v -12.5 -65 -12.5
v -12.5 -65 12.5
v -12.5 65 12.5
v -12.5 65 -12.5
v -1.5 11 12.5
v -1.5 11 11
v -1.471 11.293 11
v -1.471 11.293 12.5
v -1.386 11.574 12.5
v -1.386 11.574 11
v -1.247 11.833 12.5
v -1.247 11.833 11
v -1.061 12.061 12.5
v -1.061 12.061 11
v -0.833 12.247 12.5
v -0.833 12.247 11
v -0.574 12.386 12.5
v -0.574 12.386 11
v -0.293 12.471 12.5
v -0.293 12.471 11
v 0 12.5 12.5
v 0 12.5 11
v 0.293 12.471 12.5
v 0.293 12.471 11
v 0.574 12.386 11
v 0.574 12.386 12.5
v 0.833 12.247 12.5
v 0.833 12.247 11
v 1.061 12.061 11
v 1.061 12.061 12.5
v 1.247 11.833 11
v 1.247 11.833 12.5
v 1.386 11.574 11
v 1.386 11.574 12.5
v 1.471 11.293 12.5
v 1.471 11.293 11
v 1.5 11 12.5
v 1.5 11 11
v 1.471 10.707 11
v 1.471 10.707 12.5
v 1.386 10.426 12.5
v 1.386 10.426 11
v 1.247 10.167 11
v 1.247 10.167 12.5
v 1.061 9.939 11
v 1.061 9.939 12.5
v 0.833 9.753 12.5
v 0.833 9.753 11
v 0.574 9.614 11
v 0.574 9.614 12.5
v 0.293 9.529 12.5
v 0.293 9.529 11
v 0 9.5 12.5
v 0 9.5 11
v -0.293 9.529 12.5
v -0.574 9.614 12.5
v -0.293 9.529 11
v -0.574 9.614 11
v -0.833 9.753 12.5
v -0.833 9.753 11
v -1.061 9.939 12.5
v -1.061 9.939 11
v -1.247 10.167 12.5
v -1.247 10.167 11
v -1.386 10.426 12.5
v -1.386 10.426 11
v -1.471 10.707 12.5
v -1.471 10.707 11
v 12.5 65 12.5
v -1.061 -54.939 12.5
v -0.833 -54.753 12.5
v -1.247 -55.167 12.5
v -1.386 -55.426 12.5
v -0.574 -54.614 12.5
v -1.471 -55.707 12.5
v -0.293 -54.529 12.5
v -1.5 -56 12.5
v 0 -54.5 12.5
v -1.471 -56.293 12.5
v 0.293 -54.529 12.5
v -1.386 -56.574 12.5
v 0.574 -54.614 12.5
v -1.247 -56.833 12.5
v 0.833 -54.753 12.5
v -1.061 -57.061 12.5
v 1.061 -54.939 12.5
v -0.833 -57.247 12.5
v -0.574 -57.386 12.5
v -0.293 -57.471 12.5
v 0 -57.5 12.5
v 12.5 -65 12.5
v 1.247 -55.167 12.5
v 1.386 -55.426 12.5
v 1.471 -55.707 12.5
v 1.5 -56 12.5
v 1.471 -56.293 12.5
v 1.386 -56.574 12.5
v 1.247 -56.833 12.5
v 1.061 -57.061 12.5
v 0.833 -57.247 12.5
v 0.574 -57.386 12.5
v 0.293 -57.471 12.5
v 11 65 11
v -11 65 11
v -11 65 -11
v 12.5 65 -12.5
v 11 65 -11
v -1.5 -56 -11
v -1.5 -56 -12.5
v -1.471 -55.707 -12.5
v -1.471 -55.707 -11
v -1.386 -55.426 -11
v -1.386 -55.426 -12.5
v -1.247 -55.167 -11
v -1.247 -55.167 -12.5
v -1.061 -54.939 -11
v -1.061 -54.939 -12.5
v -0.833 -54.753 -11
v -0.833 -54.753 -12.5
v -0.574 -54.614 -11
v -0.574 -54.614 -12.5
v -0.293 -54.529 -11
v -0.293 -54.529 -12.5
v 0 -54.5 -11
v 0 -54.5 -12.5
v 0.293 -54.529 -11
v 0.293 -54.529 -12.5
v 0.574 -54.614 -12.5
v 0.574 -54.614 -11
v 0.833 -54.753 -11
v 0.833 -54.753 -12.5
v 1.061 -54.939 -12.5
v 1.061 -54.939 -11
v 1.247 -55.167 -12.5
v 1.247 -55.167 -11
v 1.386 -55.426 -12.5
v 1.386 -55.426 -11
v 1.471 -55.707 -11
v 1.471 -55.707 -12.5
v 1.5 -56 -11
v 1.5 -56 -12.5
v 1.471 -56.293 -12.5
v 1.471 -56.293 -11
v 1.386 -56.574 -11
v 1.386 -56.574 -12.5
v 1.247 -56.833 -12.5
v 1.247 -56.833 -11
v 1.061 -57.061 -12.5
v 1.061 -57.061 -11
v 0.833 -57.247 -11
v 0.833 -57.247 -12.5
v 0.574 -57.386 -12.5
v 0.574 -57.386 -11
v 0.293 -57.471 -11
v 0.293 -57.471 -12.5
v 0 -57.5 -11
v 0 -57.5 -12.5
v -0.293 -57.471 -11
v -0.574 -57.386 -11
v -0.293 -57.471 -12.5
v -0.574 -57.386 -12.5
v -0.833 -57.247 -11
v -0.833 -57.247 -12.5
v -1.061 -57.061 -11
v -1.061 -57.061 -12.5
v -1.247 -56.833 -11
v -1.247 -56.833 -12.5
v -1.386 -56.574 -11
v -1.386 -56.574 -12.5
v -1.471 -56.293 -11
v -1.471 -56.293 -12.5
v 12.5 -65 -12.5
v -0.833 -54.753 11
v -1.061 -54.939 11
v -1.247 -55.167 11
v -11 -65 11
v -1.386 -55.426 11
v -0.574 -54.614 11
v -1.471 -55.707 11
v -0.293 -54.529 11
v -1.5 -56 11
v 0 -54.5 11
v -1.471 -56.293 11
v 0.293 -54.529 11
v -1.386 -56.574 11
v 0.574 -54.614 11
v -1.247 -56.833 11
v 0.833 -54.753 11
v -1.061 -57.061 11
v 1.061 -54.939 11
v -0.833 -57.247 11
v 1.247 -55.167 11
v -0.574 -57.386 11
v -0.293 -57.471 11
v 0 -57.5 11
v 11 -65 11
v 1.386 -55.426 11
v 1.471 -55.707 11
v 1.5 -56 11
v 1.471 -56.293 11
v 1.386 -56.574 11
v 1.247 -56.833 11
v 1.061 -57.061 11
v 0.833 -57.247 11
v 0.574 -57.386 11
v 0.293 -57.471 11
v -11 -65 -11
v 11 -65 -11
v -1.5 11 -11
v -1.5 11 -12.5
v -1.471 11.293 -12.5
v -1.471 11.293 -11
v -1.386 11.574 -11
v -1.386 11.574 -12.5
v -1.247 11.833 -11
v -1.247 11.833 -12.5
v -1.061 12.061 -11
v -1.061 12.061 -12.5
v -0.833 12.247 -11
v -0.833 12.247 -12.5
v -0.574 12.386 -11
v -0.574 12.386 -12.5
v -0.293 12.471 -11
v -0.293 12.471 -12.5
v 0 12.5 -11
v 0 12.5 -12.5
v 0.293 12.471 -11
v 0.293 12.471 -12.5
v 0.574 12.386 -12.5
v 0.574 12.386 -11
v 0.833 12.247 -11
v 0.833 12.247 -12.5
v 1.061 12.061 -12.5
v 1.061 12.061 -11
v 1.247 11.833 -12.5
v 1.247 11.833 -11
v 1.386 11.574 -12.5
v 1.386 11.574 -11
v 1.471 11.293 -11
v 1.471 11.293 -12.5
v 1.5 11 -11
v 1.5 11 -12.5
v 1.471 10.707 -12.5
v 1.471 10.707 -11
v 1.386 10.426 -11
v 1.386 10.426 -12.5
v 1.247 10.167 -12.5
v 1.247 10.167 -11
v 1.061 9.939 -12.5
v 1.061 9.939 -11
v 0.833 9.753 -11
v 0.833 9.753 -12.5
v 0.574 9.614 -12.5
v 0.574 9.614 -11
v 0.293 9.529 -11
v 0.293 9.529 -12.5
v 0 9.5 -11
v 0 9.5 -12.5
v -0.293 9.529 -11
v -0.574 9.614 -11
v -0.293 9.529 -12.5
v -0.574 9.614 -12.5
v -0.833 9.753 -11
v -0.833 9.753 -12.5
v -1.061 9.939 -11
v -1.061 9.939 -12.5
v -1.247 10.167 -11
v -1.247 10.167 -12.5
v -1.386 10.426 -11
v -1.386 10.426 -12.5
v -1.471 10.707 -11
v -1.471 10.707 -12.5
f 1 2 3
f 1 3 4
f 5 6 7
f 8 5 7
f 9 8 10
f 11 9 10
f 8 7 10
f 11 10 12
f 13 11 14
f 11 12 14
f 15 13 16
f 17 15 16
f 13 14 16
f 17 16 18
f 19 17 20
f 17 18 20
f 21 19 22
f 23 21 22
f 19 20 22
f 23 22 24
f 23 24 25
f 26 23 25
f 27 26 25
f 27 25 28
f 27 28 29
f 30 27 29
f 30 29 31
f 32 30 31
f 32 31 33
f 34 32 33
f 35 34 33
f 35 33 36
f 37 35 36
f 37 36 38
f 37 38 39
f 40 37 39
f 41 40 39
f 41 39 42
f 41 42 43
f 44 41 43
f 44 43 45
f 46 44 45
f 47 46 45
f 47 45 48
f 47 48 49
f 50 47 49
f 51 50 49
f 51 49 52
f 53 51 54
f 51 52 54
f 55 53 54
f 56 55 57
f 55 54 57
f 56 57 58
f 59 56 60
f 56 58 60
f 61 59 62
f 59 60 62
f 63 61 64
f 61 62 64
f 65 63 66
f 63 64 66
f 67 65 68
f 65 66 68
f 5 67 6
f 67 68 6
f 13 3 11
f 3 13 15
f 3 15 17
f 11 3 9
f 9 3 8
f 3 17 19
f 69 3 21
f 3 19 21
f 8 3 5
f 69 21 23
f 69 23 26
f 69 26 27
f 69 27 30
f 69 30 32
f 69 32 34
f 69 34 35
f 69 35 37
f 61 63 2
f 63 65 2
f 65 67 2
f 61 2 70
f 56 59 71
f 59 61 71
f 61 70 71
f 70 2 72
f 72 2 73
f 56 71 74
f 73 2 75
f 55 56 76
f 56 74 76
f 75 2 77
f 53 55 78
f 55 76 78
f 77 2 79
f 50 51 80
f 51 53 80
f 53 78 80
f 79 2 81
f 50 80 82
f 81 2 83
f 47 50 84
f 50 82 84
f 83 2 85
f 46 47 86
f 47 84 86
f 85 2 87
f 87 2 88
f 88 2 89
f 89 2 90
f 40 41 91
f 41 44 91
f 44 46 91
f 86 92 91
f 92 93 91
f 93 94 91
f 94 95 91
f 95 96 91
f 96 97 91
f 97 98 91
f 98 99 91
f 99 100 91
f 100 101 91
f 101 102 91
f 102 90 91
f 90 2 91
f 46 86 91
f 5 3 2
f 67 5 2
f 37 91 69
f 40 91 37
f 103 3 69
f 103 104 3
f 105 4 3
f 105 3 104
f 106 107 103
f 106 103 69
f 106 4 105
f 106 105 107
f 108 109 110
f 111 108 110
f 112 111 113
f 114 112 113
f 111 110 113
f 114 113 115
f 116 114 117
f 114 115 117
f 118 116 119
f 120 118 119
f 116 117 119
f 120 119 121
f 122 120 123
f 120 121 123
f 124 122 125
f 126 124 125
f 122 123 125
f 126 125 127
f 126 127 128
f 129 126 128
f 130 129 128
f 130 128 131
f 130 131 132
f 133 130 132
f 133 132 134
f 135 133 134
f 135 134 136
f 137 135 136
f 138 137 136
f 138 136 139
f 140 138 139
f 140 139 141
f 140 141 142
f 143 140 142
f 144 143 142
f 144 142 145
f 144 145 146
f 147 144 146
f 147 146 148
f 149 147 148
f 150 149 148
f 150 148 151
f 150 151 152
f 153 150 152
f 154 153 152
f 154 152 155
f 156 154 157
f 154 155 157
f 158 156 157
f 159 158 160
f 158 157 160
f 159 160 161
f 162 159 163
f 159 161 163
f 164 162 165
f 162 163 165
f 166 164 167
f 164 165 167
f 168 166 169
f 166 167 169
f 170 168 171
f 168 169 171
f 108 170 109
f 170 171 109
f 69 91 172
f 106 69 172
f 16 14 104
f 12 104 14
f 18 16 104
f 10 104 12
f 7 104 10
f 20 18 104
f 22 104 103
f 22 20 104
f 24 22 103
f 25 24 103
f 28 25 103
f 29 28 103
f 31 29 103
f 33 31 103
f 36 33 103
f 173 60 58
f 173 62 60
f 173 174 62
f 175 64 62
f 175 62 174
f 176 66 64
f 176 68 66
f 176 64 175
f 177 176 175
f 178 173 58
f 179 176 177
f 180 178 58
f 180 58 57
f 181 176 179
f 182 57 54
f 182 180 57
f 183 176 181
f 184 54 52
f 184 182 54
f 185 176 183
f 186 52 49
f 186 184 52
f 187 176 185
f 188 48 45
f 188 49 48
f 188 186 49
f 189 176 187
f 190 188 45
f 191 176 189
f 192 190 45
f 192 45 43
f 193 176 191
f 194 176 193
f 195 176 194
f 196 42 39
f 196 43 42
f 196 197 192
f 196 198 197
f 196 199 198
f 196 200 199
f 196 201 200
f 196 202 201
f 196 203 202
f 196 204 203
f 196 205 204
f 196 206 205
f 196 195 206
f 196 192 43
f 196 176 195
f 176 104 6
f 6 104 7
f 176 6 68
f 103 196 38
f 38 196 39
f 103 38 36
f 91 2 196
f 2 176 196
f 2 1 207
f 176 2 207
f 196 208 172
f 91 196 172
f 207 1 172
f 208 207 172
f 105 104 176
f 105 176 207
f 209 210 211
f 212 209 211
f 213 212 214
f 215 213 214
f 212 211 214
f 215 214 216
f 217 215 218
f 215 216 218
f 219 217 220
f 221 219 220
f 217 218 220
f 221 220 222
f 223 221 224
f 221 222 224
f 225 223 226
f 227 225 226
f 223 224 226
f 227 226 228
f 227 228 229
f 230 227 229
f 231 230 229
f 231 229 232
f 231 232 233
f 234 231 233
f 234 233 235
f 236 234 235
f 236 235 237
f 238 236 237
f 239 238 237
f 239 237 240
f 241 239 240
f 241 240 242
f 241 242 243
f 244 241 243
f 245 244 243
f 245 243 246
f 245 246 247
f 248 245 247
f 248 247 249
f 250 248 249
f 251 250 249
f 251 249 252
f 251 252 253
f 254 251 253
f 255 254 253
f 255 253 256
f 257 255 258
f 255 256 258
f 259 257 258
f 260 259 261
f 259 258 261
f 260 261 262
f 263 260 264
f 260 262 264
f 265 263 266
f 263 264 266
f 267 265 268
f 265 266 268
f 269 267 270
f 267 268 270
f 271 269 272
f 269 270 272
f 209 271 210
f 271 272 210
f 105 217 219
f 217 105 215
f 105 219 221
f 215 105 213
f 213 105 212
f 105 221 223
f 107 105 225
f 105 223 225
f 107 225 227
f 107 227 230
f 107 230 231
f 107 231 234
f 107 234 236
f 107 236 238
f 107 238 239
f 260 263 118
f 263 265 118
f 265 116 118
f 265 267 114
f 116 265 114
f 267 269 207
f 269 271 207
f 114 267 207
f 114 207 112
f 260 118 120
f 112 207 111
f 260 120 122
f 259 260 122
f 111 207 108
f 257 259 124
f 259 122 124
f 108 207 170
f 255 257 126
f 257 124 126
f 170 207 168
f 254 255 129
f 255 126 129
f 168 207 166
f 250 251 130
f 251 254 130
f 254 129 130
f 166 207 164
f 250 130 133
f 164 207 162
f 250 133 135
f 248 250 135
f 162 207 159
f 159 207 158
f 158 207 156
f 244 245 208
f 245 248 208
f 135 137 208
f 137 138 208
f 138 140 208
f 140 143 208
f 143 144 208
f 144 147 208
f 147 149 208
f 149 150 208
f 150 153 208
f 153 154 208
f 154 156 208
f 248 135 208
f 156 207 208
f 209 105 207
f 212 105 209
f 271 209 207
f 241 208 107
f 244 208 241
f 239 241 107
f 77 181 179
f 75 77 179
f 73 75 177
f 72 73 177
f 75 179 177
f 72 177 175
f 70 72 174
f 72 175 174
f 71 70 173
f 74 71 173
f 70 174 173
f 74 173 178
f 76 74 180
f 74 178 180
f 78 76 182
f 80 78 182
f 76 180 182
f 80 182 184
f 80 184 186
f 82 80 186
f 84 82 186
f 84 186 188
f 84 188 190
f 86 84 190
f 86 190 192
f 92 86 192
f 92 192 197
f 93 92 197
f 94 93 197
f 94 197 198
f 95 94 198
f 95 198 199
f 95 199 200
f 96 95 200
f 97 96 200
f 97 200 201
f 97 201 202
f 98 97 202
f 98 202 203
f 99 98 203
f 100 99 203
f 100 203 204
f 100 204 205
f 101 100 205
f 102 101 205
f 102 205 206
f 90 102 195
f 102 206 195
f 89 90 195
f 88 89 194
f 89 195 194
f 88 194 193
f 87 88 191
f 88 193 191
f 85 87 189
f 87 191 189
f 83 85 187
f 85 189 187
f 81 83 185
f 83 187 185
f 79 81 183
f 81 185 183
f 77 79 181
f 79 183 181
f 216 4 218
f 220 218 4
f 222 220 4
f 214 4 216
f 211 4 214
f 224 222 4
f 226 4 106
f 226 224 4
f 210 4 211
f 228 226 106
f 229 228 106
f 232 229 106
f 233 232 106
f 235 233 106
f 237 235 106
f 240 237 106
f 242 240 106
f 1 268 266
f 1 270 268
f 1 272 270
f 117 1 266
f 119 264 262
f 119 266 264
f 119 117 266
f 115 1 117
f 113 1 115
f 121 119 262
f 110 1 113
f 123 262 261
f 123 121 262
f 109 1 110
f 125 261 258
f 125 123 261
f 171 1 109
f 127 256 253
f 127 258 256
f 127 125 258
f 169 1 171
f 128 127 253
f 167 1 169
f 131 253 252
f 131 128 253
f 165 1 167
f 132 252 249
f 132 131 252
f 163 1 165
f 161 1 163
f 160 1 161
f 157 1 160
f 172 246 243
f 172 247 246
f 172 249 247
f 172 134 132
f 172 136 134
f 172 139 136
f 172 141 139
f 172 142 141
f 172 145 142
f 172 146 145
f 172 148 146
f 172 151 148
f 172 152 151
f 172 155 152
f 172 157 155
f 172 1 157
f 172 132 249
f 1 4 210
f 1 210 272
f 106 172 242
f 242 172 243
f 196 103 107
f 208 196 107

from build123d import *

# Parameters (mm, degrees)
BOSS_EXTRUDE1_DEPTH      = 65
BOSS_EXTRUDE1_DEPTH_BACK = 65
SKETCH3_W                = 25
SKETCH3_H                = 25
SKETCH3_W_2              = 22
SKETCH3_H_2              = 22
SKETCH5_R                = 1.5
CUT_EXTRUDE2_DEPTH       = 25


with BuildPart() as part:
    # Sketch3 → Boss-Extrude1 (new, two sides: drawn at the far end of the back side and taken through both)
    with BuildSketch(Plane(origin=(0, 0, 0), x_dir=(1, 0, 0), z_dir=(0, 1, 0)).offset(-BOSS_EXTRUDE1_DEPTH_BACK)):
        Rectangle(SKETCH3_W, SKETCH3_H)
        Rectangle(SKETCH3_W_2, SKETCH3_H_2, mode=Mode.SUBTRACT)
    extrude(amount=BOSS_EXTRUDE1_DEPTH + BOSS_EXTRUDE1_DEPTH_BACK)

    # Sketch5 → Cut-Extrude2 (cut)
    with BuildSketch(Plane(origin=(0, 0, -12.5), x_dir=(-1, 0, 0), z_dir=(0, 0, -1))):
        with Locations((0, -56)):
            Circle(SKETCH5_R)
        with Locations((0, 11)):
            Circle(SKETCH5_R)
    extrude(amount=-CUT_EXTRUDE2_DEPTH, mode=Mode.SUBTRACT)


solid = part.part
